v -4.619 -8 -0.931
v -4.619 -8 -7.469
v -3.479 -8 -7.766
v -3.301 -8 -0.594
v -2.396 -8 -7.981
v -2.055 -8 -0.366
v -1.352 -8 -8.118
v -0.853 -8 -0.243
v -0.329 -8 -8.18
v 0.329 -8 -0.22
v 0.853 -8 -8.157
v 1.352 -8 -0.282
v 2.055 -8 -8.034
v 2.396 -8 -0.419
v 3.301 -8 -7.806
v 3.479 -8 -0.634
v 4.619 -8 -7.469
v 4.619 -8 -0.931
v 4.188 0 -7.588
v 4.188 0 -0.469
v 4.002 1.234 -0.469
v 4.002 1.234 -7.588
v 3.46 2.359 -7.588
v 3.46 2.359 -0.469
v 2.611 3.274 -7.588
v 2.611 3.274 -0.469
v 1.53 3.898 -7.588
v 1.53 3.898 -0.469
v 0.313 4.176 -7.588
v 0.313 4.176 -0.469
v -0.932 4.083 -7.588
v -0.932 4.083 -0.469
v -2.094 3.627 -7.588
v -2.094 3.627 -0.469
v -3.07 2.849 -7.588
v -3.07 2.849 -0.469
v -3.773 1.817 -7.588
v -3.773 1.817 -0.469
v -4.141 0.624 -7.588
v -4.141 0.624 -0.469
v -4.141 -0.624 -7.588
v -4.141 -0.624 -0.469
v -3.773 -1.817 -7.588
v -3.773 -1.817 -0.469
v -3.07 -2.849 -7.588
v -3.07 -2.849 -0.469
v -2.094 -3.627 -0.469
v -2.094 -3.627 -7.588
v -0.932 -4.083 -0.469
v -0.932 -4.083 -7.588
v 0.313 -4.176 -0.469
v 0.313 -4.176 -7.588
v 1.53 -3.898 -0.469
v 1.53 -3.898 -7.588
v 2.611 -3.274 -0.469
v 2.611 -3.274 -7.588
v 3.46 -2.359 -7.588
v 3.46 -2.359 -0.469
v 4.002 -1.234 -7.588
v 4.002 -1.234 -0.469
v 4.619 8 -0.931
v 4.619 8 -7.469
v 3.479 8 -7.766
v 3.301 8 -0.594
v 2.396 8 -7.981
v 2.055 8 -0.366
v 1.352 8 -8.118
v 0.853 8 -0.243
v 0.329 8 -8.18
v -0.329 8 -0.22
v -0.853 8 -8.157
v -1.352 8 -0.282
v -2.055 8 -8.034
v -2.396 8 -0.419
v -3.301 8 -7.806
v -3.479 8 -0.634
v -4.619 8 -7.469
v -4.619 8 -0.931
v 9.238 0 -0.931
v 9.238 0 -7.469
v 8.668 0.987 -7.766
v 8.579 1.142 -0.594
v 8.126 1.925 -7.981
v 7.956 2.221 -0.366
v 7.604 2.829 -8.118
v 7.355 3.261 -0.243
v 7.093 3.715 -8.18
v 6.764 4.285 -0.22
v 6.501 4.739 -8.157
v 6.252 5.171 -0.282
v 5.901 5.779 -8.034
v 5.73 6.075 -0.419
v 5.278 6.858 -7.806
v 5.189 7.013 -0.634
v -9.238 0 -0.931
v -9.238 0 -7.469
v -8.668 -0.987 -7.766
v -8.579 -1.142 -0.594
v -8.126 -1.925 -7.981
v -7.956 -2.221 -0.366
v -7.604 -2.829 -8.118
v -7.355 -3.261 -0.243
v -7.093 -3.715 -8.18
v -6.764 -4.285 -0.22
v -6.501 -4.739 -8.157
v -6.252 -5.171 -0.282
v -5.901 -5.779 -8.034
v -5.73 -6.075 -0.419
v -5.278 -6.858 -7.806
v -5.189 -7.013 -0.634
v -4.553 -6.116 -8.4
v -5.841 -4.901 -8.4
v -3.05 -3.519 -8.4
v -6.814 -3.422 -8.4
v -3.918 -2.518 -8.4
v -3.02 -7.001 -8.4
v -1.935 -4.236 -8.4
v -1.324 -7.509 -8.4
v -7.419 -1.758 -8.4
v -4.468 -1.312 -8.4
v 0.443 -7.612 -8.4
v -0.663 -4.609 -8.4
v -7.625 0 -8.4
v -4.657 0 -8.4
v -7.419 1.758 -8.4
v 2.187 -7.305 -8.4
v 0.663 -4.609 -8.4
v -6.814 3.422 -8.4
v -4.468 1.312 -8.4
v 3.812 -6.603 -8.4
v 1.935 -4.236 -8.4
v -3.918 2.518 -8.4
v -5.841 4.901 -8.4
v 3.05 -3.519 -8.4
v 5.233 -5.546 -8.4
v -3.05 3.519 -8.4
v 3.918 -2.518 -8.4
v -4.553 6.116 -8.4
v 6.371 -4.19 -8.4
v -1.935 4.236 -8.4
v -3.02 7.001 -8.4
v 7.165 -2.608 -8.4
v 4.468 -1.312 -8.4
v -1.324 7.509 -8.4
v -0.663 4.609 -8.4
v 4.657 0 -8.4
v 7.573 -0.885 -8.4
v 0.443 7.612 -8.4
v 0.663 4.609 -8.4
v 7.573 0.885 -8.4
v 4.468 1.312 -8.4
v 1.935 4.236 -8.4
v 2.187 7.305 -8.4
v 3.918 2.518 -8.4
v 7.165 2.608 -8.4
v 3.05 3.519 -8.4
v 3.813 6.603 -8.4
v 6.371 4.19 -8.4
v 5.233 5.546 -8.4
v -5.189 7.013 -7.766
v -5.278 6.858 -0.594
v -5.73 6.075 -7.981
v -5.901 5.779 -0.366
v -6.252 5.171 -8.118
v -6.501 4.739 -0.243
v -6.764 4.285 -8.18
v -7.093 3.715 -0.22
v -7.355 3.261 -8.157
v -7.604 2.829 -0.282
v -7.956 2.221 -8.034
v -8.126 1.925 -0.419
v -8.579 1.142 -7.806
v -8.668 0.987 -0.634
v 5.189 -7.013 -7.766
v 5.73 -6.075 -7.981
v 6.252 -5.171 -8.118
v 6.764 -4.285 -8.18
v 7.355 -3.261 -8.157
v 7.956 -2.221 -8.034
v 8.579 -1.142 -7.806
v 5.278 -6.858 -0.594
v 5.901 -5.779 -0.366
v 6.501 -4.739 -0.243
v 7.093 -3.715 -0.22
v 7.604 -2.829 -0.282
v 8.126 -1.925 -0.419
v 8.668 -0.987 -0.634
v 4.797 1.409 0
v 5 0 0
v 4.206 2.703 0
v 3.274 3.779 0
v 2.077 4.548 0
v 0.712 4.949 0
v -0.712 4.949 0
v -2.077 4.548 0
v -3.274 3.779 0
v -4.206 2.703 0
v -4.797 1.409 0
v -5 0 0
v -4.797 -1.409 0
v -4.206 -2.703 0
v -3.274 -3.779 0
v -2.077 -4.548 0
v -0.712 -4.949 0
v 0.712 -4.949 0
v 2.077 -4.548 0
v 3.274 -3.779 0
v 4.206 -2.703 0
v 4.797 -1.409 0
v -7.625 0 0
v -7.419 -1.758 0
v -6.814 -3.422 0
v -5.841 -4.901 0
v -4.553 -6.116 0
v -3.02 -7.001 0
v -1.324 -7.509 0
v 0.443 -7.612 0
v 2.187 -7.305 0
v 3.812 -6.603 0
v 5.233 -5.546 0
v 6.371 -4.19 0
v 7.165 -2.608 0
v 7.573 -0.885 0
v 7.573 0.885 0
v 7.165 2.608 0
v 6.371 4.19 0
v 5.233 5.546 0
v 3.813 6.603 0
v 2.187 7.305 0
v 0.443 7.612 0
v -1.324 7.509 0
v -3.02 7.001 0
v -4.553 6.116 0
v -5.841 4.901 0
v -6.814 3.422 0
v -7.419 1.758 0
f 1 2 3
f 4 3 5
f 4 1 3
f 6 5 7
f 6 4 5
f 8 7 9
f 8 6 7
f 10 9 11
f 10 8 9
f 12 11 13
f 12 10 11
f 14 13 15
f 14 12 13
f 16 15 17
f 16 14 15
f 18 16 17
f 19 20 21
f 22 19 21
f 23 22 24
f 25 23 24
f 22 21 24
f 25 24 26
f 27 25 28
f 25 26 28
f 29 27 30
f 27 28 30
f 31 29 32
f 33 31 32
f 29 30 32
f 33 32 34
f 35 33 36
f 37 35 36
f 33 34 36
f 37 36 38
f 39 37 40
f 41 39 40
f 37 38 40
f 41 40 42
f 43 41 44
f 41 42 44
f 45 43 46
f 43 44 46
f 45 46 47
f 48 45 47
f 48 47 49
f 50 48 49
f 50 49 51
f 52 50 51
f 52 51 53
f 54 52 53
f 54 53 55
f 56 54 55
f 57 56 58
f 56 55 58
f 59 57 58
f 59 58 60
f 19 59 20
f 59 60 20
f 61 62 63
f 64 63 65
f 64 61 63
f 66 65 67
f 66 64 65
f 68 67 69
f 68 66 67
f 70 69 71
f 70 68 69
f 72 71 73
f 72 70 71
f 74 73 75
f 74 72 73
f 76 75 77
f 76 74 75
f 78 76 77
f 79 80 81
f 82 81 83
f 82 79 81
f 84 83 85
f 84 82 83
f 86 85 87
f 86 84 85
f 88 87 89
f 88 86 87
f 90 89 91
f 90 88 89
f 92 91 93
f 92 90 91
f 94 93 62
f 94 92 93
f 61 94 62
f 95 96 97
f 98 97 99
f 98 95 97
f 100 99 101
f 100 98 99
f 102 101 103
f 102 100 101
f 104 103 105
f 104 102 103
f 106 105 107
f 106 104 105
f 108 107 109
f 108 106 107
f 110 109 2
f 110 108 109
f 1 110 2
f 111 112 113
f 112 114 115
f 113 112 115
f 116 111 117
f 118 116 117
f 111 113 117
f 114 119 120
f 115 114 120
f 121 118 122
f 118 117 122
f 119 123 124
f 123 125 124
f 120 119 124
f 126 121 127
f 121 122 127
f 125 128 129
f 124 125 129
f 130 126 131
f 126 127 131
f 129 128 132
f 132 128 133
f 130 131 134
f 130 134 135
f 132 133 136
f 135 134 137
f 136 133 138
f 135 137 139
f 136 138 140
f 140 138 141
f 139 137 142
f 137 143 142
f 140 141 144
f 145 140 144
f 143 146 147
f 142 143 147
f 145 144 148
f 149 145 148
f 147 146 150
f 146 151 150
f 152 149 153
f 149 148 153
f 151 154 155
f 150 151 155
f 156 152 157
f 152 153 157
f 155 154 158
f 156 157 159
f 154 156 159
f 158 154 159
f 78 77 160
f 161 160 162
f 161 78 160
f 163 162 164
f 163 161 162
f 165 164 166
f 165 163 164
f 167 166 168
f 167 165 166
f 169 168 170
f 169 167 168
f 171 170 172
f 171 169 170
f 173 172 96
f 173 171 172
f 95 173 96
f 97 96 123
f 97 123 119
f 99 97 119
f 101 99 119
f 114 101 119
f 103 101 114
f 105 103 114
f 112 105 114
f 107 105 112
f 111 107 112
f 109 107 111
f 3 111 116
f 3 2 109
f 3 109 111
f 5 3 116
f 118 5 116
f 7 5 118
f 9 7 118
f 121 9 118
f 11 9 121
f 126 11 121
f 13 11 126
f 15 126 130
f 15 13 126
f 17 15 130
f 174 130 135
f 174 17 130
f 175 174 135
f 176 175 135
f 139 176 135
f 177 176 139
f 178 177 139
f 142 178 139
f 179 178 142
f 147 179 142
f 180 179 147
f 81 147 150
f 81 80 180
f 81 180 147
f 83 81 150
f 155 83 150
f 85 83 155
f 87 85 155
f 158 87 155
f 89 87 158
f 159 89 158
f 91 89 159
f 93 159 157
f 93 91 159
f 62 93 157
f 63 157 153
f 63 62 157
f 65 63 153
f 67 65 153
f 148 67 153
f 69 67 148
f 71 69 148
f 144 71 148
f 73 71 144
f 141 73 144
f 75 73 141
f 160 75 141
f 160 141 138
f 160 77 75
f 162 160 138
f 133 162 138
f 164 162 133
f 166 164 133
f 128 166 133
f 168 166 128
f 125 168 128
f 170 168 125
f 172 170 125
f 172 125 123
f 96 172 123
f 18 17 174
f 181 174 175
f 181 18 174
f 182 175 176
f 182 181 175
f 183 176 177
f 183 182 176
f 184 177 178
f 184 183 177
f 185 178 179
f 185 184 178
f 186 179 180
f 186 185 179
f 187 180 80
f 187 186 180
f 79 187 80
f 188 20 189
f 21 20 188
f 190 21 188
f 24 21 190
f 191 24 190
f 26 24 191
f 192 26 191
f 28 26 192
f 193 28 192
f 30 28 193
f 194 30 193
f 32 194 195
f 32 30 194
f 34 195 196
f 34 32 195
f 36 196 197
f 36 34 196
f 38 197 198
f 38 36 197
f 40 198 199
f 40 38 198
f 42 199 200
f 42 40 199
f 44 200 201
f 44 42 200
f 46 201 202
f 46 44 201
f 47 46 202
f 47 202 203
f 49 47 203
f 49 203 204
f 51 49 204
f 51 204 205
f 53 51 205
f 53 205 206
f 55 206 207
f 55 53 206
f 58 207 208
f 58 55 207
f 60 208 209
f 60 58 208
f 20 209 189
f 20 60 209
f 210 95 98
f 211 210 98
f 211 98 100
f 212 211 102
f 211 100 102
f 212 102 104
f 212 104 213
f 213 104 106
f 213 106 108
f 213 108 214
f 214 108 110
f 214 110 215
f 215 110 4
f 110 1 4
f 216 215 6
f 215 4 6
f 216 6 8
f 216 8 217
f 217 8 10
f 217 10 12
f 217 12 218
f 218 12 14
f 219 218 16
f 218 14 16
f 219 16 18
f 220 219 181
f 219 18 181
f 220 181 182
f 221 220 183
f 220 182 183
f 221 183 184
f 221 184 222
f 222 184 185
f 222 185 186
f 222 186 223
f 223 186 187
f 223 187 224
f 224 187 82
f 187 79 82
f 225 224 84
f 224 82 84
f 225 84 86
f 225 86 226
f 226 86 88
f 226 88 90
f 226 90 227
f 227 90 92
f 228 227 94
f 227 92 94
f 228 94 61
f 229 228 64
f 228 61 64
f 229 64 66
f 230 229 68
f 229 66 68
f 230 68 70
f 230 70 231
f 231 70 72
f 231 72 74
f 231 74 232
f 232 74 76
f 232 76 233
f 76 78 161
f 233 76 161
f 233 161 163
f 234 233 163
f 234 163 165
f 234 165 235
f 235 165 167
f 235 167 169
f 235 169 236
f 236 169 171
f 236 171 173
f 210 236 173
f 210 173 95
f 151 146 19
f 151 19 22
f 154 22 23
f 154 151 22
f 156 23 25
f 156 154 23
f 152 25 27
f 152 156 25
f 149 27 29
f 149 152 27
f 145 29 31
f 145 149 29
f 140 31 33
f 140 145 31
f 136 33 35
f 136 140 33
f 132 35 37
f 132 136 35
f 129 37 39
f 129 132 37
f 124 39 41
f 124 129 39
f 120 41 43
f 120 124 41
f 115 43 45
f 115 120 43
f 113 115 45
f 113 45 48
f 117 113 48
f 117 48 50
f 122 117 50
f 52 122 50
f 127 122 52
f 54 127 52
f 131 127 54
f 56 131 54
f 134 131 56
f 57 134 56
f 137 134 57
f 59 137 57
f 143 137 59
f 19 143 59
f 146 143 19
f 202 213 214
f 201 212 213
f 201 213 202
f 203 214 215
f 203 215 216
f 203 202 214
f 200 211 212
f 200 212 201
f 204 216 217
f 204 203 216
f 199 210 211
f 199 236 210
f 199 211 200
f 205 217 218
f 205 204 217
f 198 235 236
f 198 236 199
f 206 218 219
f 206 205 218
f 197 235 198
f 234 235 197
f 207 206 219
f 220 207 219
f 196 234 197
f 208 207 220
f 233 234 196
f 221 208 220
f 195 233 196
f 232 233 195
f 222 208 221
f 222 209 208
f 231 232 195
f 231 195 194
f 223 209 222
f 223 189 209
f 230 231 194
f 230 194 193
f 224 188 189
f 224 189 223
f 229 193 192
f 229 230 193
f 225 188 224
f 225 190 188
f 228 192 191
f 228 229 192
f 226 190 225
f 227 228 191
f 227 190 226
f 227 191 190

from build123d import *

# Parameters (mm, degrees)
SKETCH1_R               = 4.188
BASENUT_DEPTH           = 8.4
ENDCHAMFER_SIZE         = 0.812
ENDCHAMFER_SIZE2        = 0.468808419
ENDCHAMFER_PART_2_SIZE  = 0.812
ENDCHAMFER_PART_2_SIZE2 = 0.468808419


with BuildPart() as part:
    # Sketch1 → BaseNut (new body)
    with BuildSketch(Plane.XY):
        Polygon((9.237604307, 0), (4.618802154, 8), (-4.618802154, 8), (-9.237604307, 0), (-4.618802154, -8), (4.618802154, -8), align=None)
        Circle(SKETCH1_R, mode=Mode.SUBTRACT)
    extrude(amount=-BASENUT_DEPTH)

    # Sketch2 → Double-Chamfer (revolve, cut)
    with BuildSketch(Plane(origin=(0, 0, 0), x_dir=(1, 0, 0), z_dir=(0, 1, 0))):
        Polygon((-9.237604307, 8.4), (-7.625, 8.4), (-9.237604307, 7.468962469), align=None)
        Polygon((-9.237604307, 0.931037531), (-9.237604307, 0), (-7.625, 0), align=None)
    revolve(axis=Axis((0, 0, -3.375940562), (0, 0, 1)), mode=Mode.SUBTRACT)

    # EndChamfer
    endchamfer_edges = [part.edges().sort_by_distance(p)[0] for p in [
        (-4.188, 0, -8.4),
    ]]
    endchamfer_side = [part.faces().sort_by_distance(p)[0] for p in [
        (-4.188, 0, -4.2),
    ]]
    chamfer(endchamfer_edges, length=ENDCHAMFER_SIZE, length2=ENDCHAMFER_SIZE2, reference=endchamfer_side[0])

    # EndChamfer part 2
    endchamfer_part_2_edges = [part.edges().sort_by_distance(p)[0] for p in [
        (-4.188, 0, 0),
    ]]
    endchamfer_part_2_side = [part.faces().sort_by_distance(p)[0] for p in [
        (7.409332432, 0, 0),
    ]]
    chamfer(endchamfer_part_2_edges, length=ENDCHAMFER_PART_2_SIZE, length2=ENDCHAMFER_PART_2_SIZE2, reference=endchamfer_part_2_side[0])


solid = part.part
